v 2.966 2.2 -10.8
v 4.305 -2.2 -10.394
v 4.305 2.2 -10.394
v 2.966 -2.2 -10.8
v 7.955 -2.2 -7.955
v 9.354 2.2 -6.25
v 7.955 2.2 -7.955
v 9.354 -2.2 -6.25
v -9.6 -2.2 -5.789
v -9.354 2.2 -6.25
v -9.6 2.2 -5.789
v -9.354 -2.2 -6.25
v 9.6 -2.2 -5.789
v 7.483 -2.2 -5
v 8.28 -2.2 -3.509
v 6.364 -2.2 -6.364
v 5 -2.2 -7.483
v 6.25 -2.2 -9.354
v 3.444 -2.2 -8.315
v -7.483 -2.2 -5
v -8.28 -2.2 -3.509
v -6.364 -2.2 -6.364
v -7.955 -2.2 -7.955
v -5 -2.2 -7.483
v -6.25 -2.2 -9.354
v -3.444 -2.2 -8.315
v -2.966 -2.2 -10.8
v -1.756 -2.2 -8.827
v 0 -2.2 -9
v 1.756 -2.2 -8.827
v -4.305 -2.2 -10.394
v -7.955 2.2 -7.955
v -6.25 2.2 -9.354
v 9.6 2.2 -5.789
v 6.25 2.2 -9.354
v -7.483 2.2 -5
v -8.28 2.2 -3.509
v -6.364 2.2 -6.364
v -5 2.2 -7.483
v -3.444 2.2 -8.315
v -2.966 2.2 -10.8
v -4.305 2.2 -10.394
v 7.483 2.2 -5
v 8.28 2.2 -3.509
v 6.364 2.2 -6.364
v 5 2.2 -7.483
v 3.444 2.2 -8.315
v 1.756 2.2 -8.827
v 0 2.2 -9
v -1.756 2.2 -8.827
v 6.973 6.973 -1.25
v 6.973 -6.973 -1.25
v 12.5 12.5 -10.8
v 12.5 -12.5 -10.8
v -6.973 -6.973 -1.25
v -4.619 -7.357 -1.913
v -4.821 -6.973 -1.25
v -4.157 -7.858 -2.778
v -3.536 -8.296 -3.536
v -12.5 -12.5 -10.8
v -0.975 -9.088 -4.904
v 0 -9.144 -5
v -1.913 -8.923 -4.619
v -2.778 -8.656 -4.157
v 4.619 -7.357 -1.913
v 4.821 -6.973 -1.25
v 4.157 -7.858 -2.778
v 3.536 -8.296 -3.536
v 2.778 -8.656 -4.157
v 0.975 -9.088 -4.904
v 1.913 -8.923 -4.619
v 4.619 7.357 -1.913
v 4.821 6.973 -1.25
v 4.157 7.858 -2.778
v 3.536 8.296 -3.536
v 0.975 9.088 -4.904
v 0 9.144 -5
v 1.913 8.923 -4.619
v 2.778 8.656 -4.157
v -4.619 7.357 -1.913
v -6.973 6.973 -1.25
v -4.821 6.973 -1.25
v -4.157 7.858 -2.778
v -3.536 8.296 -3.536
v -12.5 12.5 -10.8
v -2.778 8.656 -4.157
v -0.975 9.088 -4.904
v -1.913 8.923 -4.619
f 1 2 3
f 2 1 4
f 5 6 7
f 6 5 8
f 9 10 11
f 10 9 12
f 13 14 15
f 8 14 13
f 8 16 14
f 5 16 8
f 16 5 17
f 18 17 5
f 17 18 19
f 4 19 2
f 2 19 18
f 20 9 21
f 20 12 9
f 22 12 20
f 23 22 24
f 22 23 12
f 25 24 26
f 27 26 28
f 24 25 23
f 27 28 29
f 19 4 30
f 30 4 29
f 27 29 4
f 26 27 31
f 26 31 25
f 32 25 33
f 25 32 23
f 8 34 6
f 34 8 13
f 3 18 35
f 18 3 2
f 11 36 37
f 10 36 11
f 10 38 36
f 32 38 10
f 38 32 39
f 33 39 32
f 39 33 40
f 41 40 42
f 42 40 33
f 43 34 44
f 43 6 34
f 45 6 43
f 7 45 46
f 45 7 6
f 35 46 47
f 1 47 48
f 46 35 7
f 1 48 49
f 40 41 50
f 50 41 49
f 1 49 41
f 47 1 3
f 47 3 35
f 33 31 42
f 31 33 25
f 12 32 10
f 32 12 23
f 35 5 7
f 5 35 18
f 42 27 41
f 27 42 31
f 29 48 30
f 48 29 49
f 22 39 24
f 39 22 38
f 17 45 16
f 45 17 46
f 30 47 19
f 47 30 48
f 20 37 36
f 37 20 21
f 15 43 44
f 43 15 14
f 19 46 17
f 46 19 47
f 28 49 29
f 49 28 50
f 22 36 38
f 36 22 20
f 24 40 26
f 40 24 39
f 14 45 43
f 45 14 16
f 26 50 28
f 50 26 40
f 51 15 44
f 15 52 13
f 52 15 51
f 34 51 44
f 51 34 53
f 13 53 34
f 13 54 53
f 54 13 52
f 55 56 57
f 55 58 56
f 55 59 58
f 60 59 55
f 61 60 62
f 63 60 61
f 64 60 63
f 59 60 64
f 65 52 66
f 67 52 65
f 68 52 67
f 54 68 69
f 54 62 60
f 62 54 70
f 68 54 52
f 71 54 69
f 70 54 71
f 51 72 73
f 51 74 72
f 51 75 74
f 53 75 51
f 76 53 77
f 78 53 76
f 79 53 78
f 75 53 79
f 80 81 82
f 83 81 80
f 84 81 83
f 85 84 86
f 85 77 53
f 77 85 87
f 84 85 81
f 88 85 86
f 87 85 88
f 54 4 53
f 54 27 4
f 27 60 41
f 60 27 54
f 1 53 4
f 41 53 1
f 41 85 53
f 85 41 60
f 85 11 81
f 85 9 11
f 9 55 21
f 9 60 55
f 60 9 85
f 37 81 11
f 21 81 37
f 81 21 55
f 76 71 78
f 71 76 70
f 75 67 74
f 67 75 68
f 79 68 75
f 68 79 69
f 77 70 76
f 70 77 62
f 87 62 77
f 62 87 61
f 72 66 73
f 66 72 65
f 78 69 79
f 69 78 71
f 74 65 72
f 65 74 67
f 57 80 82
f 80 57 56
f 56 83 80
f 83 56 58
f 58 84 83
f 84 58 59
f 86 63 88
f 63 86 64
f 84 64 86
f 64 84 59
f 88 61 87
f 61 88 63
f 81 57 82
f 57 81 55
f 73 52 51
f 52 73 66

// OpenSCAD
// Parameterizable cable tie anchor
// Ned Konz, ned@bike-nomad.com

// max. diameter of wire bundle, mm
wire_diameter = 10;
// width of cable tie, mm
tie_width = 3.4;
// thickness of cable tie, mm
tie_thickness = 1.5;
// wire to slot ID, mm
slot_spacing = 4;
// additional space on top and bottom of tie, mm
vertical_tolerance = 1.5;
// additional space at sides of tie, mm
horizontal_tolerance = 0.5;

/* [Hidden] */
// width of slot for cable tie
slot_width = tie_width + 2 * horizontal_tolerance;
// height of slot for cable tie
slot_height = tie_thickness + 2 * vertical_tolerance;
slot_id = wire_diameter + slot_spacing * 2;
slot_od = slot_id + 2 * slot_height;
block_side = wire_diameter * 2.5;
block_height = slot_od * 0.8;

$fn = 32;

module slot(diameter,height,width) {
	difference() {
		cylinder(h=width, d=diameter + height, center=true);
		cylinder(h=width, d=diameter, center=true);
	}
}

module block(side,height) {
	s2 = side / 2;
	polyhedron(
  points=[ [s2,s2,0],[s2,-s2,0],[-s2,-s2,0],[-s2,s2,0], // the four points at base
           [0,0,height]  ],                                 // the apex point 
  faces=[ [0,1,4],[1,2,4],[2,3,4],[3,0,4],              // each triangle side
              [1,0,3],[2,1,3] ]                         // two triangles for square base
 );
}

difference() {
	translate([0,0,-block_height/2])
		block(block_side, block_height);
	rotate([90,0,0])
		slot(slot_id, slot_height, slot_width);
	rotate([90,0,0])
		cylinder(h=block_side, d=wire_diameter, center=true);
	translate([0,0,block_side/2])
		cube(block_side * 1.1, center=true);
	
}
